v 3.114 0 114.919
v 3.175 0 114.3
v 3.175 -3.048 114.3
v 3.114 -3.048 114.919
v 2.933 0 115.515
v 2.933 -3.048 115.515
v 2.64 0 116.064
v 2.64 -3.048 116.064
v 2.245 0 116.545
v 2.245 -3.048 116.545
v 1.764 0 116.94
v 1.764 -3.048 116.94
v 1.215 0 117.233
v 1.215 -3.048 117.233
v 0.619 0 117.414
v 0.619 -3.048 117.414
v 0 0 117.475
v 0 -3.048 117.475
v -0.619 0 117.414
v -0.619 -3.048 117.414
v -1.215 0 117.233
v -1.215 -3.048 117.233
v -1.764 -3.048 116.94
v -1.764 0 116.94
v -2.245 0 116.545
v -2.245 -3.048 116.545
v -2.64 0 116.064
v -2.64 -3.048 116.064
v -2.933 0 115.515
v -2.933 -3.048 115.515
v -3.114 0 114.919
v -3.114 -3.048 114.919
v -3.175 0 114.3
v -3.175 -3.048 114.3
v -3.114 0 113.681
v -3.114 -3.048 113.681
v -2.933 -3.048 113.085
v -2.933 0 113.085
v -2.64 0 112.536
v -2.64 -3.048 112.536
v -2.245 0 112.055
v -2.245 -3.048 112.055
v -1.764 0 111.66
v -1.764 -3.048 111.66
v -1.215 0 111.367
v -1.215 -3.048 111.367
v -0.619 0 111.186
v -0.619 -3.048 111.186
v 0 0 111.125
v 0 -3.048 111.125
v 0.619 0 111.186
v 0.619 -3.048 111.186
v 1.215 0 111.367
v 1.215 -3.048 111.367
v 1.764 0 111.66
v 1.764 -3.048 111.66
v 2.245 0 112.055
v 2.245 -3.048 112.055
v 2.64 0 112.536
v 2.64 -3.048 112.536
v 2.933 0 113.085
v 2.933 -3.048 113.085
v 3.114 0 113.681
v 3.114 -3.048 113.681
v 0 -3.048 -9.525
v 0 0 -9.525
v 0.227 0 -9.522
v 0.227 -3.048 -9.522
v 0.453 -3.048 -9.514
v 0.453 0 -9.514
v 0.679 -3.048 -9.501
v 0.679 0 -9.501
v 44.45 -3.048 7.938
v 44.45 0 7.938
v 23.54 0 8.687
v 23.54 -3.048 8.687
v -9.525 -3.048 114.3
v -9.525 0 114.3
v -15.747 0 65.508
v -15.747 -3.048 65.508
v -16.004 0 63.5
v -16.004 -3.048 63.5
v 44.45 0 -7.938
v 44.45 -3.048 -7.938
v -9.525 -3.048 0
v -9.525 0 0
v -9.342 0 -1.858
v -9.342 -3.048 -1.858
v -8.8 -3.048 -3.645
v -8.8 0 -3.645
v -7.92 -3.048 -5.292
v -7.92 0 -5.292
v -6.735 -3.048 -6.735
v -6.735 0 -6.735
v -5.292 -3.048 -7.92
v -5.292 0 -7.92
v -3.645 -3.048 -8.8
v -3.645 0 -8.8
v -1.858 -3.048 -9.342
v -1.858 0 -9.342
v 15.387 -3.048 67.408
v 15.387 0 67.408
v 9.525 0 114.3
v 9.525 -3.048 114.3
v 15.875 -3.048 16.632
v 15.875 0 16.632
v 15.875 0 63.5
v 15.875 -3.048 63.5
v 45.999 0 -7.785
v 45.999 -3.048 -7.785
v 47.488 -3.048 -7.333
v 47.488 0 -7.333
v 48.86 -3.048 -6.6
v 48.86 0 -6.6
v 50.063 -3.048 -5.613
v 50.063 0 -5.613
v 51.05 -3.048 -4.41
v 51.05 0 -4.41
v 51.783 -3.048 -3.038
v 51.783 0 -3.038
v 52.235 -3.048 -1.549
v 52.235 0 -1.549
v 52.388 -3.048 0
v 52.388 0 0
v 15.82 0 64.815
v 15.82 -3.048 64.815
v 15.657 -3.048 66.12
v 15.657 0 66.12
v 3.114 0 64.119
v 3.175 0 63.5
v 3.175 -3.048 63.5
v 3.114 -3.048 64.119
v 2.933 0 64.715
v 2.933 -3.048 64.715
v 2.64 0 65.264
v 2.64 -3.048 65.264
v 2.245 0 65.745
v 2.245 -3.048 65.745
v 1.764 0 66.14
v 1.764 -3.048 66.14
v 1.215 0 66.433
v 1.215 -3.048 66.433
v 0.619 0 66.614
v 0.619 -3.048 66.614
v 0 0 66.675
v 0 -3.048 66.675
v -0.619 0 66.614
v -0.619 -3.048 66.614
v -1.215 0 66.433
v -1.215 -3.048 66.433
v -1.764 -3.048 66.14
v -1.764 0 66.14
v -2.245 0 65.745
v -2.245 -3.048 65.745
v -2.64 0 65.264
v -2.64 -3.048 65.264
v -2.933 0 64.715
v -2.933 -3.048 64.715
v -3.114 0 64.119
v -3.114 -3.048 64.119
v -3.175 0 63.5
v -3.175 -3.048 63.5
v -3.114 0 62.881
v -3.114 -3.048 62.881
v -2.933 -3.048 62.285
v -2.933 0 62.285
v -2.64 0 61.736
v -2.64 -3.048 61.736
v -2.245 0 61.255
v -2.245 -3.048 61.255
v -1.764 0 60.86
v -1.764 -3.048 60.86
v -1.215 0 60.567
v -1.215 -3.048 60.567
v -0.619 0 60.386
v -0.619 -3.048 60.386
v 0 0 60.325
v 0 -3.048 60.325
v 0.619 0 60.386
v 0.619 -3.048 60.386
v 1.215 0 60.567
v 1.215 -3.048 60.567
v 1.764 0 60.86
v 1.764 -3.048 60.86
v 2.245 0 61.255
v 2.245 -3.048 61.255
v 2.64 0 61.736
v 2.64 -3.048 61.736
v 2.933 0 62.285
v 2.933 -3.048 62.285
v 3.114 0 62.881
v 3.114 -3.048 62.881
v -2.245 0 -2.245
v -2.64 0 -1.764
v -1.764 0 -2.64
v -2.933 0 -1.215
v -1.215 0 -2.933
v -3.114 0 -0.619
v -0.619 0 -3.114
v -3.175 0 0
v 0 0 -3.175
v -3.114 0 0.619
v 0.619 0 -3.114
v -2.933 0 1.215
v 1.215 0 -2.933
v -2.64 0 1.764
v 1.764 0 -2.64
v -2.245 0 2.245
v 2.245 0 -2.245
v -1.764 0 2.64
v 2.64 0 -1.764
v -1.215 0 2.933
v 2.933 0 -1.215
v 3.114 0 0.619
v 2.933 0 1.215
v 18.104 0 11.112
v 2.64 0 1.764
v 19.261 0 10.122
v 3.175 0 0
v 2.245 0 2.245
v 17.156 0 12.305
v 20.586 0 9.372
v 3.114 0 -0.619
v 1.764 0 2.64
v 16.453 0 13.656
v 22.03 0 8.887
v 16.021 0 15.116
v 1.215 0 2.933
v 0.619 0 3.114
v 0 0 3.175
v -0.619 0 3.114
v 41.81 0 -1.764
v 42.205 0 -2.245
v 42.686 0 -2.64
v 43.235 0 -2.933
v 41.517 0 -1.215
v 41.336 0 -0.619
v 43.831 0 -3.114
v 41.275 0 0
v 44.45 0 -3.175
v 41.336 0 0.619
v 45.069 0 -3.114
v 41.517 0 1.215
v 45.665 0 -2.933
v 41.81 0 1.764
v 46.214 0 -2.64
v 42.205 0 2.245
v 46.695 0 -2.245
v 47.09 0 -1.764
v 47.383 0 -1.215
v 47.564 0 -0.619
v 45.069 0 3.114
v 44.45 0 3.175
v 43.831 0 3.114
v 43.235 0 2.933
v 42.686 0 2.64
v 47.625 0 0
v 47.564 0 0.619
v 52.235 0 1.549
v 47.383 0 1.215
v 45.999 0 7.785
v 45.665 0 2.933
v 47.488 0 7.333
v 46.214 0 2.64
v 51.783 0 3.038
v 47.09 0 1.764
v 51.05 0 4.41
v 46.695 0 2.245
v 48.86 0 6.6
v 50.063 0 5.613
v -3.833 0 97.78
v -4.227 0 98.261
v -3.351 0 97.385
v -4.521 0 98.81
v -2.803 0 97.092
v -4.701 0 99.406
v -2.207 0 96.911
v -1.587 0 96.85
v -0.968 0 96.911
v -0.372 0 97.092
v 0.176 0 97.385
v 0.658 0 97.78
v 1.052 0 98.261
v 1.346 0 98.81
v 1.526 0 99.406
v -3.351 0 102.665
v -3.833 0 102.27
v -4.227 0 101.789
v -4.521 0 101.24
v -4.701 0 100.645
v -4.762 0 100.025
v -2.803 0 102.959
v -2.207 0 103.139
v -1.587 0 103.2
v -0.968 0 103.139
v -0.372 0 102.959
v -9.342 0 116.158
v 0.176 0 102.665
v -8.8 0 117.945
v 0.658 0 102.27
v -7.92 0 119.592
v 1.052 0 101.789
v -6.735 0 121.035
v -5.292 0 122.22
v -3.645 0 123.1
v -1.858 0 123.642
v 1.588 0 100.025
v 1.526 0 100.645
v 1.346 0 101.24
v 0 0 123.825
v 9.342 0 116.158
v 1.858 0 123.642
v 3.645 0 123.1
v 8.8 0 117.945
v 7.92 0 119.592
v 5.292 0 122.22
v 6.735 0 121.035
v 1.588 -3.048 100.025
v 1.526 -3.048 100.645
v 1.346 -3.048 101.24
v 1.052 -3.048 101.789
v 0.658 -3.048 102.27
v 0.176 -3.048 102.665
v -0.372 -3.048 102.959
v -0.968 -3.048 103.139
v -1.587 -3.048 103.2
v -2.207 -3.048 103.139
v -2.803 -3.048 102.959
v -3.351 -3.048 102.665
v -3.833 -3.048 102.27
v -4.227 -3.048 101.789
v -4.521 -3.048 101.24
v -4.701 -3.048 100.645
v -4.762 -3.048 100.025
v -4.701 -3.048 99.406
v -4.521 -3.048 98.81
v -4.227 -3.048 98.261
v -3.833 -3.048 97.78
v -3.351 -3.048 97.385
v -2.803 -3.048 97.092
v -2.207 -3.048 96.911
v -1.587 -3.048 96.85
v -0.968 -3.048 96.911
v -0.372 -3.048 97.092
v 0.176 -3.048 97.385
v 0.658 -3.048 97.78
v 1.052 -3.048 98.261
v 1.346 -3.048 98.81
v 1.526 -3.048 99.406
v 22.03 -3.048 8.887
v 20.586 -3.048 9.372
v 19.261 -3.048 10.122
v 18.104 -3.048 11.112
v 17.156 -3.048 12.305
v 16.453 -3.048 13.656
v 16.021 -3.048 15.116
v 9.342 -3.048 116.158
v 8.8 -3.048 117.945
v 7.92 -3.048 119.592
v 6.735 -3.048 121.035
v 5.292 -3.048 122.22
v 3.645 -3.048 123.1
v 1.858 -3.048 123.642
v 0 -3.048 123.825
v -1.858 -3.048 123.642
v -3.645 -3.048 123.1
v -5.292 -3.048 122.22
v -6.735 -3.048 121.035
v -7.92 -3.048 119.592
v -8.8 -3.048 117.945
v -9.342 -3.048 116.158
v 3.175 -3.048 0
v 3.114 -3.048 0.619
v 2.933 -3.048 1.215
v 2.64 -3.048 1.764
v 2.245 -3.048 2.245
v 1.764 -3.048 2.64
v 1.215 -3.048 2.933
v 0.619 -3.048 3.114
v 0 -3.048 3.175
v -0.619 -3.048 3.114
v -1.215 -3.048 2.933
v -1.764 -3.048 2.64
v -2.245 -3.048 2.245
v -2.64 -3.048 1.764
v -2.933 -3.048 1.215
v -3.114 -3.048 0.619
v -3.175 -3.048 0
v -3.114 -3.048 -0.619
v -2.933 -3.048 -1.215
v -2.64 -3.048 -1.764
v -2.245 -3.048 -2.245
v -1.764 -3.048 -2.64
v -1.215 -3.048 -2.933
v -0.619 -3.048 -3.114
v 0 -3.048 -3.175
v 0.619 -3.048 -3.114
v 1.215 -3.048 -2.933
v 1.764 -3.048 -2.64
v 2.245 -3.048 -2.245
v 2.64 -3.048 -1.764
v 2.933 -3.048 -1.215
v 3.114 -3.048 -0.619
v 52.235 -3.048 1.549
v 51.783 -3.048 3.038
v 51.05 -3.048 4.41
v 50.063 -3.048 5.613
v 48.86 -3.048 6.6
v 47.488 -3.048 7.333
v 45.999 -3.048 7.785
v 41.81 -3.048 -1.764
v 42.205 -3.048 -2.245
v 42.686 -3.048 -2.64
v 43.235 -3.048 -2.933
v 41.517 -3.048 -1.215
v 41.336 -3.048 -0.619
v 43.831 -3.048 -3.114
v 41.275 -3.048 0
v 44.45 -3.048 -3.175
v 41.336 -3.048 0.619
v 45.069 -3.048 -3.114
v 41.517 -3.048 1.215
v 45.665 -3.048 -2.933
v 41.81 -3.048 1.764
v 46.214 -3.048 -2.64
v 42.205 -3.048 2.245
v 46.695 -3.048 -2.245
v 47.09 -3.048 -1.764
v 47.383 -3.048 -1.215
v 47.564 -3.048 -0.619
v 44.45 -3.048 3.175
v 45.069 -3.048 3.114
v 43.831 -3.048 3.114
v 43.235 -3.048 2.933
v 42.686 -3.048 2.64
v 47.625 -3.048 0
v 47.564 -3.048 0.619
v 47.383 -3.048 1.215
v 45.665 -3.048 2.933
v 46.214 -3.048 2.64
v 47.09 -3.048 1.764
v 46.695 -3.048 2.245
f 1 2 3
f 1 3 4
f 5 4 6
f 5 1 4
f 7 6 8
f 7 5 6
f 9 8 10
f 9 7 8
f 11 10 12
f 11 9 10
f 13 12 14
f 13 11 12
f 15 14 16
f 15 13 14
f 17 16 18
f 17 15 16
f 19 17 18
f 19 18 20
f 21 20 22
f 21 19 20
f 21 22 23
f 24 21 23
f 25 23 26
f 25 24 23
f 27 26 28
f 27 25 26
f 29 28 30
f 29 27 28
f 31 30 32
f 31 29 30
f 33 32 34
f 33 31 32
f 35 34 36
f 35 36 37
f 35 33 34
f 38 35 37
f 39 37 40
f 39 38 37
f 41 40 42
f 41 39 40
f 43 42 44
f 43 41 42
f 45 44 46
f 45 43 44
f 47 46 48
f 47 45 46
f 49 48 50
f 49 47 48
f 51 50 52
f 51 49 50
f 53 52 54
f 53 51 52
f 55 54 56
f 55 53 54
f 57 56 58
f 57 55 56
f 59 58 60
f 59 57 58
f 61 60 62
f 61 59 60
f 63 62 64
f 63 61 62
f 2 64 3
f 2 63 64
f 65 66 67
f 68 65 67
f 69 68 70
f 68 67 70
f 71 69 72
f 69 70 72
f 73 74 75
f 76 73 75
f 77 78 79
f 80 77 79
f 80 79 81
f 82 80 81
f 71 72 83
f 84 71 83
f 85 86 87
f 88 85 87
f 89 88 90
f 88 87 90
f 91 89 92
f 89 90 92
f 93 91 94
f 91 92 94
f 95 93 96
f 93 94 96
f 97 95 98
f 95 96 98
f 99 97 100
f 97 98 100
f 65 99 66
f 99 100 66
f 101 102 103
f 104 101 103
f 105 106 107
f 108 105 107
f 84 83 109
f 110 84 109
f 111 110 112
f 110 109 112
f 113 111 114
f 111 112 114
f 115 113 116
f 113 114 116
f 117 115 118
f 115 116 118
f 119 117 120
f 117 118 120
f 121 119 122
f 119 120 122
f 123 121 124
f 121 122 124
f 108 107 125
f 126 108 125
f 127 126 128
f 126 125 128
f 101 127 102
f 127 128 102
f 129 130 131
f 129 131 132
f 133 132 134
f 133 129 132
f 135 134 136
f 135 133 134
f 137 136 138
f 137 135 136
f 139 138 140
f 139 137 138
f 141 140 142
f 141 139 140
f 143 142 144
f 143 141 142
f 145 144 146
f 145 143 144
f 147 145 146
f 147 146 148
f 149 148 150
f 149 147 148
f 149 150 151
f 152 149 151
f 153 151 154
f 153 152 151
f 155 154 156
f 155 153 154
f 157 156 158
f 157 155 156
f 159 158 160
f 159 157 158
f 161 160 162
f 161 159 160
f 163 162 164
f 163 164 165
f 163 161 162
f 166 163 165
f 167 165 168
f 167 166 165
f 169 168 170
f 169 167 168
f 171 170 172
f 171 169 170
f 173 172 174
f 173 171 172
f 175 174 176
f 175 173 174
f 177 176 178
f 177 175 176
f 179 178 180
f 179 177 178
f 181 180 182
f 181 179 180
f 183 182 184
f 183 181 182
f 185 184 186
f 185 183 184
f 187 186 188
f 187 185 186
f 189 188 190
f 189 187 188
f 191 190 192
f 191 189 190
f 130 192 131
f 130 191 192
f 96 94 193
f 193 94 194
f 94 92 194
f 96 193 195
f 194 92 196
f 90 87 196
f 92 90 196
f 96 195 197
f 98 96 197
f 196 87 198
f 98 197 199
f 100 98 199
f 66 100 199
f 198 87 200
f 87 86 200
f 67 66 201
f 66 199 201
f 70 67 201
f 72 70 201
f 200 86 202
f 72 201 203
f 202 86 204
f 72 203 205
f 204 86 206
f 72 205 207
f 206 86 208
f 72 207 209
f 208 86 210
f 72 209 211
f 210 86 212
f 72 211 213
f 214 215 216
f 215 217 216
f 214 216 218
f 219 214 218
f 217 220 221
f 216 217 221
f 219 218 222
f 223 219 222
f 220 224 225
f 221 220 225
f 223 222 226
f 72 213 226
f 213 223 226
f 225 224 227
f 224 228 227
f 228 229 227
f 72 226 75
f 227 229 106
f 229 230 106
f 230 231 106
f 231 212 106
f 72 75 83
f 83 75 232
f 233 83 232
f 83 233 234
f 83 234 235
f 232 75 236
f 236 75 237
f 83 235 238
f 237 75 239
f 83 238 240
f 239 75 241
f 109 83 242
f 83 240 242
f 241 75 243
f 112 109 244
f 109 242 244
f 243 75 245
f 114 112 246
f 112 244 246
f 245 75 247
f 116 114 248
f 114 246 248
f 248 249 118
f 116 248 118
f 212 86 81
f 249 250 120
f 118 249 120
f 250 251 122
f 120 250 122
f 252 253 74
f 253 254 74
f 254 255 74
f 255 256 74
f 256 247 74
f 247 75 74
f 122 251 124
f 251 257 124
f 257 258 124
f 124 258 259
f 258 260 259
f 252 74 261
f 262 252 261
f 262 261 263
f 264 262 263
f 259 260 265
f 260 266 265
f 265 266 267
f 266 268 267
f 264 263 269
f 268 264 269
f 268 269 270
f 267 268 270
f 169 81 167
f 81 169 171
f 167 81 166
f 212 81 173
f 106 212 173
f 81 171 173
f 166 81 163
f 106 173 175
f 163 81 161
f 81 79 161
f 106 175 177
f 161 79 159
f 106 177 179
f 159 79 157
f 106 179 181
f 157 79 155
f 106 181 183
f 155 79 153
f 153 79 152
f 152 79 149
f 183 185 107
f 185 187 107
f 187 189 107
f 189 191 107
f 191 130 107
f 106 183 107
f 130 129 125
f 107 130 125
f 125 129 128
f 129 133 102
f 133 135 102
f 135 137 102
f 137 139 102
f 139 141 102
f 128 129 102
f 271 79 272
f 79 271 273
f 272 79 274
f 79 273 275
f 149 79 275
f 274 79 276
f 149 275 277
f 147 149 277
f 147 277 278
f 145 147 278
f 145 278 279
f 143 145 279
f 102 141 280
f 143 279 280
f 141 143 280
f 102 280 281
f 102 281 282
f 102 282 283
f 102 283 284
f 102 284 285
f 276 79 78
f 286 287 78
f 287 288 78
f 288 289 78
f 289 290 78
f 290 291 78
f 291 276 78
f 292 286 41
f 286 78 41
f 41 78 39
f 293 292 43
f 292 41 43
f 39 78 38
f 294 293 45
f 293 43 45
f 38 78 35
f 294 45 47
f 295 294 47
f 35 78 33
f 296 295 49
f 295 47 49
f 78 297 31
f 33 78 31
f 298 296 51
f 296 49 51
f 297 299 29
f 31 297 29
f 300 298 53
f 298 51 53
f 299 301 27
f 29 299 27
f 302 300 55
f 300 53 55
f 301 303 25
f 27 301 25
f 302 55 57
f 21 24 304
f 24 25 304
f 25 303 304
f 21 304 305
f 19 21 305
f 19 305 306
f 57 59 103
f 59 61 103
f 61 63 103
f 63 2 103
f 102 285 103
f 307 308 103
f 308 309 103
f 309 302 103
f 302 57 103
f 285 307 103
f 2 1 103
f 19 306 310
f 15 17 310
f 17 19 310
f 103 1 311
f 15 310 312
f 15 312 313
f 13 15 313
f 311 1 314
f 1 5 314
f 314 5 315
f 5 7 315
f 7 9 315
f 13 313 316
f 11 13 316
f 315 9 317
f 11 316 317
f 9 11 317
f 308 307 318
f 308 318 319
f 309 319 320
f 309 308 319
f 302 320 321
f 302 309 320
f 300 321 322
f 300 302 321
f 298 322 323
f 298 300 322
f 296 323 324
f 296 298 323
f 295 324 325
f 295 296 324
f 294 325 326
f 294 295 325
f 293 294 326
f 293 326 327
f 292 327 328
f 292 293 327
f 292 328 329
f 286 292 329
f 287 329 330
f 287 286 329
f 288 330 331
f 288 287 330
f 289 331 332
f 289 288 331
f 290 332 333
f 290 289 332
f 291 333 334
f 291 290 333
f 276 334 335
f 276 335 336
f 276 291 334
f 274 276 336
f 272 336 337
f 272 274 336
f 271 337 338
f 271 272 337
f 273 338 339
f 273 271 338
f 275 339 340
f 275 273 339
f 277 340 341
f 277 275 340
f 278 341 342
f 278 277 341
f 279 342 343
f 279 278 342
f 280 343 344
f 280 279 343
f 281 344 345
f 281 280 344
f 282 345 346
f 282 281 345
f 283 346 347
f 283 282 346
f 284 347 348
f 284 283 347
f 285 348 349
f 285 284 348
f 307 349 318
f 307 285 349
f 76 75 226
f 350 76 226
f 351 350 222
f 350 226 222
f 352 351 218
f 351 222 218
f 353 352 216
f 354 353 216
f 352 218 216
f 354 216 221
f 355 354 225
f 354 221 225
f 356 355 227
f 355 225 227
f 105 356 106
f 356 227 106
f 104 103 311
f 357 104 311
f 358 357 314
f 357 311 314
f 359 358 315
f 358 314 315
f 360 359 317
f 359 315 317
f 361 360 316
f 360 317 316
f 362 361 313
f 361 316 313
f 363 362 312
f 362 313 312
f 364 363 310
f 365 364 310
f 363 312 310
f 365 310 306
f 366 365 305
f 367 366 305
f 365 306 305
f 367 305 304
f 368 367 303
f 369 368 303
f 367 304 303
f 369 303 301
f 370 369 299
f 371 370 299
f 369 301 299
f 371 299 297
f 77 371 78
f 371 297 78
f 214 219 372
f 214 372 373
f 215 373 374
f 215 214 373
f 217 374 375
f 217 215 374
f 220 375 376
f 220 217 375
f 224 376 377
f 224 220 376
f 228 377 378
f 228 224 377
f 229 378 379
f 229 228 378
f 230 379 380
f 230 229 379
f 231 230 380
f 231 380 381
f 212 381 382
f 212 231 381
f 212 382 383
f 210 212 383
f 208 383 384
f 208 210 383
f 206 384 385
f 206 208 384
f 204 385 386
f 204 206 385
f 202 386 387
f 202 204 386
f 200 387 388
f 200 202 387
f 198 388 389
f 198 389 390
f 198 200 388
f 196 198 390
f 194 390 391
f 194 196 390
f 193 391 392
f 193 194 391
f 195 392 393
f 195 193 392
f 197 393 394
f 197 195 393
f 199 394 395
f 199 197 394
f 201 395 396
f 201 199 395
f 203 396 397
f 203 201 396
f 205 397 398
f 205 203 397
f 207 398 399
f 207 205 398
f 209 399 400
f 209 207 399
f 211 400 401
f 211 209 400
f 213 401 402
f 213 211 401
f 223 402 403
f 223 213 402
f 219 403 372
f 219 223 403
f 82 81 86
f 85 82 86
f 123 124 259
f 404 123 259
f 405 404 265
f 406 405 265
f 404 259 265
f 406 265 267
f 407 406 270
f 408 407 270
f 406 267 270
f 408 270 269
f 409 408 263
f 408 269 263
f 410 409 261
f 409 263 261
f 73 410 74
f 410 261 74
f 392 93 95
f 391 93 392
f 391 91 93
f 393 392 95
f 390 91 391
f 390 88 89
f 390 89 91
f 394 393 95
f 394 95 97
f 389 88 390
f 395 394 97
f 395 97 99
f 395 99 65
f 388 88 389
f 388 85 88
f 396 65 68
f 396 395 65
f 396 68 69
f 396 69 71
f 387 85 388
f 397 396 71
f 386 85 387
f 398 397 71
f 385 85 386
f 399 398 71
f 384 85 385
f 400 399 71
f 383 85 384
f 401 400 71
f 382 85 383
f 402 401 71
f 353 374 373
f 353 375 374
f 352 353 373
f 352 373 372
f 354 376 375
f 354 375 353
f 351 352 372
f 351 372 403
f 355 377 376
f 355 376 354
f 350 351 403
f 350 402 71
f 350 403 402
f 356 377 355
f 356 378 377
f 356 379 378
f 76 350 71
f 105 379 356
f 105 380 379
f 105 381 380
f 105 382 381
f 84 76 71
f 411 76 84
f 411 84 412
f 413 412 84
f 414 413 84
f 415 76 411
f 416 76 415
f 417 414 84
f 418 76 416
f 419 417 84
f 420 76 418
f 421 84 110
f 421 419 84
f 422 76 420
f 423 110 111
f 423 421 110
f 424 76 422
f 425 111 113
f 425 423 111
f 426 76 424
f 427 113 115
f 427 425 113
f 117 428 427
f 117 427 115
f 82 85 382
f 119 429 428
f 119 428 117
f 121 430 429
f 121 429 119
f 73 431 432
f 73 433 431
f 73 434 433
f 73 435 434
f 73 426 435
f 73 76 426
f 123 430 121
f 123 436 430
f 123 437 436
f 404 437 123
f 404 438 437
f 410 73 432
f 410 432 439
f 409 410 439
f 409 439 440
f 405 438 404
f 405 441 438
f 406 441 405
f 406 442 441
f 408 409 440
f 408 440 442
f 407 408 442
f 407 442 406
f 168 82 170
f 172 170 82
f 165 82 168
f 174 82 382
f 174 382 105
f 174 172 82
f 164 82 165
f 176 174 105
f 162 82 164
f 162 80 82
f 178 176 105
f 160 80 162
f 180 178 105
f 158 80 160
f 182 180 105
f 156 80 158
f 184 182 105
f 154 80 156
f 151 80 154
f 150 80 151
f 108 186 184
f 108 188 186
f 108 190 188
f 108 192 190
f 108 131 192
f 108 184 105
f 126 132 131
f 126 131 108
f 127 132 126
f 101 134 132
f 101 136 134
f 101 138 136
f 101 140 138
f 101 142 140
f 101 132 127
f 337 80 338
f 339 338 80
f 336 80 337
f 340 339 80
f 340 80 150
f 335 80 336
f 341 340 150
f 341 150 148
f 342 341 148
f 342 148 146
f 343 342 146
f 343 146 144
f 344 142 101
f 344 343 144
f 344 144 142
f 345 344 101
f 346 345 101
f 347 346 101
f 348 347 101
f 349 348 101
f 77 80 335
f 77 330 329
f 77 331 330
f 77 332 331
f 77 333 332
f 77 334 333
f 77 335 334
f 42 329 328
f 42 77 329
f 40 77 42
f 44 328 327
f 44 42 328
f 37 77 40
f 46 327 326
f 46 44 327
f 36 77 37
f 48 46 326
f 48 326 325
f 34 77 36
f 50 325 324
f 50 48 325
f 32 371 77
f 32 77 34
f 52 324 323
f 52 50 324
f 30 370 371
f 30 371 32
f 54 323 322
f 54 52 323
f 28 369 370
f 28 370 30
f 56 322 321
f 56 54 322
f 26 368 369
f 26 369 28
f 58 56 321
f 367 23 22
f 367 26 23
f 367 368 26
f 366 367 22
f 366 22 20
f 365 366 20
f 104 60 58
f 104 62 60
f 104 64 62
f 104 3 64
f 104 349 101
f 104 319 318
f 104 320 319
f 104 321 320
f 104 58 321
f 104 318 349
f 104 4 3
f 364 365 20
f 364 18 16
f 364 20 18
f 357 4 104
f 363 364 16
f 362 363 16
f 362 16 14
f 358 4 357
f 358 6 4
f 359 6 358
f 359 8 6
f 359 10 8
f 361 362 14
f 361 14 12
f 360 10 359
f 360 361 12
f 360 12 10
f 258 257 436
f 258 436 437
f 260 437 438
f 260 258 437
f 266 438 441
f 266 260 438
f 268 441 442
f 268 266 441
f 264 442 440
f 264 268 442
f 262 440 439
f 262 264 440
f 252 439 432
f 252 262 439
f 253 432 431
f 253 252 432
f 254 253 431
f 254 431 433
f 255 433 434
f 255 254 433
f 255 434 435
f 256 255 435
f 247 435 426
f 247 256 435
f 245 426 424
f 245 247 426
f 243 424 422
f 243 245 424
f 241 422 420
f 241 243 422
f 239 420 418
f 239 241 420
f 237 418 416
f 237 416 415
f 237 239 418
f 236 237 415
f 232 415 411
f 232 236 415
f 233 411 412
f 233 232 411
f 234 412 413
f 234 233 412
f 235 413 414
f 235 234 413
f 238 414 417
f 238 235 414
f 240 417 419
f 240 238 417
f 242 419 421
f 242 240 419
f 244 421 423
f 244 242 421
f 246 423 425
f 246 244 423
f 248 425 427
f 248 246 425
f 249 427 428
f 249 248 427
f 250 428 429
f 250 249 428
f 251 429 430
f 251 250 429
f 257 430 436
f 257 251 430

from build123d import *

# Parameters (mm, degrees)
F0_R     = 3.175
F1_DEPTH = 3.048


with BuildPart() as f1:
    # F0 (on Front) → F1 (new body)
    with BuildSketch(Plane.XZ):
        with BuildLine():
            ThreePointArc((0.6794904459, -9.5007324841), (6.9712901065, -6.4905114784), (9.525, 0))
            ThreePointArc((9.525, 0), (0, 9.525), (-9.525, 0))
            ThreePointArc((-9.525, 0), (-6.7351920908, -6.7351920908), (0, -9.525))
            Line((0, -9.525), (0.6794904459, -9.5007324841))
        make_face()
        Circle(F0_R, mode=Mode.SUBTRACT)
        with BuildLine():
            ThreePointArc((-9.525, 0), (0, 9.525), (9.525, 0))
            ThreePointArc((9.525, 0), (6.9712901065, -6.4905114784), (0.6794904459, -9.5007324841))
            Line((0.6794904459, -9.5007324841), (44.45, -7.9375))
            ThreePointArc((44.45, -7.9375), (36.5125, 0), (44.45, 7.9375))
            Line((44.45, 7.9375), (23.5403527632, 8.6871518144))
            ThreePointArc((23.5403527632, 8.6871518144), (18.1037372263, 11.1122342659), (15.875, 16.6322472884))
            Line((15.875, 16.6322472884), (15.875, 63.5))
            ThreePointArc((15.875, 63.5), (-1.0061676981, 47.6569178642), (-15.7474568899, 65.5082894468))
            Line((-15.7474568899, 65.5082894468), (-16.0035761028, 63.5))
            Line((-16.0035761028, 63.5), (-9.525, 0))
        make_face()
        with BuildLine():
            ThreePointArc((0, -9.525), (0.3399618281, -9.5189311877), (0.6794904459, -9.5007324841))
            Line((0.6794904459, -9.5007324841), (0, -9.525))
        make_face()
        with BuildLine():
            ThreePointArc((44.45, 7.9375), (36.5125, 0), (44.45, -7.9375))
            ThreePointArc((44.45, -7.9375), (50.0626600757, -5.6126600757), (52.3875, 0))
            ThreePointArc((52.3875, 0), (50.0626600757, 5.6126600757), (44.45, 7.9375))
        make_face()
        with Locations((44.45, 0)):
            Circle(F0_R, mode=Mode.SUBTRACT)
        with BuildLine():
            Line((-9.525, 114.3), (-15.7474568899, 65.5082894468))
            ThreePointArc((-15.7474568899, 65.5082894468), (-0.9666945407, 79.3455396457), (15.3865384615, 67.4076923077))
            Line((15.3865384615, 67.4076923077), (9.525, 114.3))
            ThreePointArc((9.525, 114.3), (0, 104.775), (-9.525, 114.3))
        make_face()
        with Locations((-1.5875, 100.0252)):
            Circle(F0_R, mode=Mode.SUBTRACT)
        with BuildLine():
            ThreePointArc((15.3865384615, 67.4076923077), (-0.9666945407, 79.3455396457), (-15.7474568899, 65.5082894468))
            ThreePointArc((-15.7474568899, 65.5082894468), (-1.0061676981, 47.6569178642), (15.875, 63.5))
            Line((15.875, 63.5), (15.3865384615, 67.4076923077))
        make_face()
        with Locations((0, 63.5)):
            Circle(F0_R, mode=Mode.SUBTRACT)
        with BuildLine():
            ThreePointArc((15.875, 63.5), (15.7524112928, 65.4690514116), (15.3865384615, 67.4076923077))
            Line((15.3865384615, 67.4076923077), (15.875, 63.5))
        make_face()
        with BuildLine():
            ThreePointArc((9.525, 114.3), (0, 123.825), (-9.525, 114.3))
            ThreePointArc((-9.525, 114.3), (0, 104.775), (9.525, 114.3))
        make_face()
        with Locations((0, 114.3)):
            Circle(F0_R, mode=Mode.SUBTRACT)
    extrude(amount=F1_DEPTH)


solid = f1.part
